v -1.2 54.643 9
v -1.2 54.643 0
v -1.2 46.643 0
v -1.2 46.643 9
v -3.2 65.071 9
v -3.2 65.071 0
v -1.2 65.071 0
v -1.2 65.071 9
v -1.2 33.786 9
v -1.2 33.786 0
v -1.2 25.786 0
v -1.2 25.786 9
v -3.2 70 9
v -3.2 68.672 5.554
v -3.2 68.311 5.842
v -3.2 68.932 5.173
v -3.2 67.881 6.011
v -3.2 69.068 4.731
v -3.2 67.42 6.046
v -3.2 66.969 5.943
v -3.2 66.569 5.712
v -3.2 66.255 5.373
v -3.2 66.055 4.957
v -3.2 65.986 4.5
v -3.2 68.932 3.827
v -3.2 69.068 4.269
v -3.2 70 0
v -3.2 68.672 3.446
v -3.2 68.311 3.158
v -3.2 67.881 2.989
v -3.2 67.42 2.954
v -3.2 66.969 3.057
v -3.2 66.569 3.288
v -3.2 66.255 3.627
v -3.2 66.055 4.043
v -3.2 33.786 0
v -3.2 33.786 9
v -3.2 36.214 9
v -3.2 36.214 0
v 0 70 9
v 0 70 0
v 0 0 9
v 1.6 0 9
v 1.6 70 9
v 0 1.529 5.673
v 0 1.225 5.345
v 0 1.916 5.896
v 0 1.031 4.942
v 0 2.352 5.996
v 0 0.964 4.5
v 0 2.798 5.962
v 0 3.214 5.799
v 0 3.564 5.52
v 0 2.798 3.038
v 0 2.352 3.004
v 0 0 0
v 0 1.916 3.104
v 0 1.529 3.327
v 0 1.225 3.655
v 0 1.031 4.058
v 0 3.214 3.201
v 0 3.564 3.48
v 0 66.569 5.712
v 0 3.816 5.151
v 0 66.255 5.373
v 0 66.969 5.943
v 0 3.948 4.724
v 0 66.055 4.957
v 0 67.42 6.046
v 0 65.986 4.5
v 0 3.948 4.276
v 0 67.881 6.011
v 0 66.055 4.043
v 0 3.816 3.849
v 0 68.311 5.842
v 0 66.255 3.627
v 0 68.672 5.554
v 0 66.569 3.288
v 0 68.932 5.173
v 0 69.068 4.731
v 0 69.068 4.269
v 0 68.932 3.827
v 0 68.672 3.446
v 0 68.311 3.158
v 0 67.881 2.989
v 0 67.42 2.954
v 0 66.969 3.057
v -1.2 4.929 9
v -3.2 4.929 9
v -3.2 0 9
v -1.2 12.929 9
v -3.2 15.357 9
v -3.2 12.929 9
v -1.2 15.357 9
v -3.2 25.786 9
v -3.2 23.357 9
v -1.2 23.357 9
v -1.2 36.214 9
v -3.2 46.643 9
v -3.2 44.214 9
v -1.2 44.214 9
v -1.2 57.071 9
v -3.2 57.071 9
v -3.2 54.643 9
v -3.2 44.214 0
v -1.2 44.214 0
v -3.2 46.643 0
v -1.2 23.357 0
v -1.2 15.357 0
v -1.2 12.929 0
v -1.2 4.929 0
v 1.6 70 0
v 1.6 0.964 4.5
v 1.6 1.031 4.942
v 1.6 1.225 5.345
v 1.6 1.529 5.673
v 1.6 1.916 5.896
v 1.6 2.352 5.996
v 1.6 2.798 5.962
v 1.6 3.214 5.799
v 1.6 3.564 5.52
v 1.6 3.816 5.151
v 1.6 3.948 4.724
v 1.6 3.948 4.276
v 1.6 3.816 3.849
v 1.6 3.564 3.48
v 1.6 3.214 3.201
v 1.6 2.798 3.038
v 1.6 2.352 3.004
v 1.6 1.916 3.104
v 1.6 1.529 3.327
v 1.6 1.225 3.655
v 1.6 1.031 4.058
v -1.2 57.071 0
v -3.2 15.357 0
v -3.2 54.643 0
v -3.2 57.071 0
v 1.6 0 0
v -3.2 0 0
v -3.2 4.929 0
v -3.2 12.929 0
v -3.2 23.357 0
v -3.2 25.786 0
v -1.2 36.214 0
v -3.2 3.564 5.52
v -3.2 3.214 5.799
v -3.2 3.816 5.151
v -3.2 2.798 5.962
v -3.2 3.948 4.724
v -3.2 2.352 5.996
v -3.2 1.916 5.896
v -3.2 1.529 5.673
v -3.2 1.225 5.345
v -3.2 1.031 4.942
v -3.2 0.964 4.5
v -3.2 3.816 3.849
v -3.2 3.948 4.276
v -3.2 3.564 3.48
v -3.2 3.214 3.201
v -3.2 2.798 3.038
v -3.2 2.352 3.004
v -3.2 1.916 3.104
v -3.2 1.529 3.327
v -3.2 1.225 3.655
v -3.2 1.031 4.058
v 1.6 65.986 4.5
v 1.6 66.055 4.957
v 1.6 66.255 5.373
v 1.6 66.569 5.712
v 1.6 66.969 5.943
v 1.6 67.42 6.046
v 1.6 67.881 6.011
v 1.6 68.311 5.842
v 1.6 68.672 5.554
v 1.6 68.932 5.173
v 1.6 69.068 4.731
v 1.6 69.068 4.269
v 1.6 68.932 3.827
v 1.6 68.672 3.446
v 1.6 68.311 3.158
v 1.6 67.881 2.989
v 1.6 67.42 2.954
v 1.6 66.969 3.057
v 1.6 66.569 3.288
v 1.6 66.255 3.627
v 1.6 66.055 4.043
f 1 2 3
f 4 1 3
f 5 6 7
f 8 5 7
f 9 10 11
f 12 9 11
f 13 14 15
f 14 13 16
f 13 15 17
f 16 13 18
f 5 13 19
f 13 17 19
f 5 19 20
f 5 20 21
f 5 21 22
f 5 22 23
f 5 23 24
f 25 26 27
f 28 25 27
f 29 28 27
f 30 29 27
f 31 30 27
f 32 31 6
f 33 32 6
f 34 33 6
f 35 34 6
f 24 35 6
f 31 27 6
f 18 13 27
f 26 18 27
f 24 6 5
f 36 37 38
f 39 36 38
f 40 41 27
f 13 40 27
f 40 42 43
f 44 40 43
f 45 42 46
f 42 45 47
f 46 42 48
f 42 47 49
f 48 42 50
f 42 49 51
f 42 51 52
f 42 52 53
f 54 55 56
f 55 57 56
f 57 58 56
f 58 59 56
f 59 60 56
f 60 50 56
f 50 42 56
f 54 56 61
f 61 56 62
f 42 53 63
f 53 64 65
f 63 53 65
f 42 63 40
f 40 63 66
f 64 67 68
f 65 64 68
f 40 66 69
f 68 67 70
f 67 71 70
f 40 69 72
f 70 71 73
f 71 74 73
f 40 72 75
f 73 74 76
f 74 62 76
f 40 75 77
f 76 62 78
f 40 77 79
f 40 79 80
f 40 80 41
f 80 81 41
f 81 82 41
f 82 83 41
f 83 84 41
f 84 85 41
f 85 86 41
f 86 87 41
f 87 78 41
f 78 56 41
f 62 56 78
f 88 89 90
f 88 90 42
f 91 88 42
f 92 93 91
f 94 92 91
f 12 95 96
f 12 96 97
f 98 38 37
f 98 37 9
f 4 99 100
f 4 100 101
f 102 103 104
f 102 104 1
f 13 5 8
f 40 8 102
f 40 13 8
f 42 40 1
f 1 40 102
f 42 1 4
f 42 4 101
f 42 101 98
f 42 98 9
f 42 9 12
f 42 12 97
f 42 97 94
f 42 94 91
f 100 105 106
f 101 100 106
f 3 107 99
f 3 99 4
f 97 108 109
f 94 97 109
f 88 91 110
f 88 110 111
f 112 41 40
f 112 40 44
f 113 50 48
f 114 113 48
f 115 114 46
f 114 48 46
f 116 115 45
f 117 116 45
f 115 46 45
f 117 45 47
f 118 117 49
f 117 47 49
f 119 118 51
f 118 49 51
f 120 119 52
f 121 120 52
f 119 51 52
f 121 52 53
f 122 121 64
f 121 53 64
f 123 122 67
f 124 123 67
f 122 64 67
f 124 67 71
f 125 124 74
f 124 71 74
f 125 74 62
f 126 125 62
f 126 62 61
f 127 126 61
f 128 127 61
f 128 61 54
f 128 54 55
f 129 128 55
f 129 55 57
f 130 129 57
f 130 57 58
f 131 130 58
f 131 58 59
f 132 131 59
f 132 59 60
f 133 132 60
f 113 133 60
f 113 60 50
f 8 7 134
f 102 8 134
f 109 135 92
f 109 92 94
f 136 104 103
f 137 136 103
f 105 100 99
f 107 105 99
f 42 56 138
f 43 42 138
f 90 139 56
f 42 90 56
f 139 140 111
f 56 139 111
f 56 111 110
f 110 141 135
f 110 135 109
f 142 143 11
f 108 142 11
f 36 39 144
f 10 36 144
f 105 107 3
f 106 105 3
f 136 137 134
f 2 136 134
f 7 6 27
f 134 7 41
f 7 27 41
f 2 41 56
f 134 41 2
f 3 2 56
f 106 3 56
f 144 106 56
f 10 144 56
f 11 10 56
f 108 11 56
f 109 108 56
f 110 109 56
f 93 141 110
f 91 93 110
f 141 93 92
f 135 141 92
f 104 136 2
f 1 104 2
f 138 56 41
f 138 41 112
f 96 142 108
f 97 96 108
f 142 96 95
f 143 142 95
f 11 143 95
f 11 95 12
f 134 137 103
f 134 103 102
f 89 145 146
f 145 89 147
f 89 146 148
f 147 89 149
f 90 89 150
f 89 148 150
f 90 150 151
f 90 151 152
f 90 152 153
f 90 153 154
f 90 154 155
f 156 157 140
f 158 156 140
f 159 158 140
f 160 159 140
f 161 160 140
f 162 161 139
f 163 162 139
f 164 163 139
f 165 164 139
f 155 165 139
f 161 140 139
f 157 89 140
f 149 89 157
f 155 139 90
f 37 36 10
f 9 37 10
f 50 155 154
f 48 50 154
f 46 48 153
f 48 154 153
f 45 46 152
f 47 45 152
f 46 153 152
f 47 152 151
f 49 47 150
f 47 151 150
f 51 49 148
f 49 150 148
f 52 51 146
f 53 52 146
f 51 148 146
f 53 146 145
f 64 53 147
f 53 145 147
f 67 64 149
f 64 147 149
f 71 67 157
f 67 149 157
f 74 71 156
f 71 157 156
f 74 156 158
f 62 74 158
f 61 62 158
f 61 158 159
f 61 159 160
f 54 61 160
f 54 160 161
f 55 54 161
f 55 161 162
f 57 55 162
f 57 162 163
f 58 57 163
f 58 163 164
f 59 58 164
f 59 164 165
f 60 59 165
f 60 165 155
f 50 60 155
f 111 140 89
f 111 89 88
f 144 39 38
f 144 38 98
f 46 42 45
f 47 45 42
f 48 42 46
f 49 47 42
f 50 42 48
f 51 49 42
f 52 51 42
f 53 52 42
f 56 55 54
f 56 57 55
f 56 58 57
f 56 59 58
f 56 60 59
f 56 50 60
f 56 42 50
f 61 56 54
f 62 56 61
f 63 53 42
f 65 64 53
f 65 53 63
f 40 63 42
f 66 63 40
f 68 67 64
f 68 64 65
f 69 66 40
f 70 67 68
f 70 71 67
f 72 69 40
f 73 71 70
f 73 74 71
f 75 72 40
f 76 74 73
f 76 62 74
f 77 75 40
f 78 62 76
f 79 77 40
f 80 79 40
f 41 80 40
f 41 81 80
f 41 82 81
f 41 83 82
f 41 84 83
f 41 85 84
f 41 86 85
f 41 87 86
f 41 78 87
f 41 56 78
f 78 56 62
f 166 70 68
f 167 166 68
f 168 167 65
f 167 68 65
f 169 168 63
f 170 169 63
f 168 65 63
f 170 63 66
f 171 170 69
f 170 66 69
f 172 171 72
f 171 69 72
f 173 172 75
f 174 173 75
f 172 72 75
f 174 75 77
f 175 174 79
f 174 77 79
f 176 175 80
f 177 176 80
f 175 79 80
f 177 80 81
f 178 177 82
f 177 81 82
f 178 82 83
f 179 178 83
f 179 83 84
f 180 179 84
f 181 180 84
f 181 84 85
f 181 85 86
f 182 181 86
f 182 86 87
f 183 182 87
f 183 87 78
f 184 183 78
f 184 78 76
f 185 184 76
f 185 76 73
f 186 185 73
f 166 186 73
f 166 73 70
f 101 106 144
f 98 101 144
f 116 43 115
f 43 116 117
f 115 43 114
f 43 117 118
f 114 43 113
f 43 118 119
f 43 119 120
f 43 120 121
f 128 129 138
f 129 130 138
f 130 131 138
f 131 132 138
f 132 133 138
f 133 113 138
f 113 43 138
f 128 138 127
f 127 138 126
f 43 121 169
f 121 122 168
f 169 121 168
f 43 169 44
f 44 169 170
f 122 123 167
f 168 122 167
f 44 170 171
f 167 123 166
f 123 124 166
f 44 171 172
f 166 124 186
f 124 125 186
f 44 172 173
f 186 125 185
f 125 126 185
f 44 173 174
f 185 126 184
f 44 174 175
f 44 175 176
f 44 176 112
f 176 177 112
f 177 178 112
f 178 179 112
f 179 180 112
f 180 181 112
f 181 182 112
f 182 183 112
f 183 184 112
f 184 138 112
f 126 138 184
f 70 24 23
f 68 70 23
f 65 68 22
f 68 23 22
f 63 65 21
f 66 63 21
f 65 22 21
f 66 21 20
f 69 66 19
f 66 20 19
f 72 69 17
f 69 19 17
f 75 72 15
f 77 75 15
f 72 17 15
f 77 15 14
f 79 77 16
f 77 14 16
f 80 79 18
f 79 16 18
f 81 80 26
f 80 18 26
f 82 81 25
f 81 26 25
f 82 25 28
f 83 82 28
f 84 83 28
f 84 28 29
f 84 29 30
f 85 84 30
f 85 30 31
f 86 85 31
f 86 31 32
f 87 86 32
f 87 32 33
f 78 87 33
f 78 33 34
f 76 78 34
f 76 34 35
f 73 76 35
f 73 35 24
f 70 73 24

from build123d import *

# Parameters (mm, degrees)
F0_W     = 2
F0_H     = 2.5
F0_H_2   = 2.4285714286
F2_DEPTH = 9
F1_W     = 1.6
F1_H     = 70
F3_R     = 1.55
F3_R_2   = 1.5
F4_DEPTH = 4.801


with BuildPart() as f2:
    # F0 (on Top) → F2 (new body)
    with BuildSketch(Plane.XY):
        Polygon((0, 70), (-1.2, 70), (-1.2, 67.5), (-1.2, 65.0714285714), (-1.2, 57.0714285714), (-1.2, 54.6428571429), (-1.2, 46.6428571429), (-1.2, 44.2142857143), (-1.2, 36.2142857143), (-1.2, 33.7857142857), (-1.2, 25.7857142857), (-1.2, 23.3571428571), (-1.2, 15.3571428571), (-1.2, 12.9285714286), (-1.2, 4.9285714286), (-1.2, 2.5), (-1.2, 0), (0, 0), align=None)
        with Locations((-2.2, 68.75)):
            Rectangle(F0_W, F0_H)
        with Locations((-2.2, 66.2857142857)):
            Rectangle(F0_W, F0_H_2)
        with Locations((-2.2, 1.25)):
            Rectangle(F0_W, F0_H)
        with Locations((-2.2, 55.8571428571)):
            Rectangle(F0_W, F0_H_2)
        with Locations((-2.2, 3.7142857143)):
            Rectangle(F0_W, F0_H_2)
        with Locations((-2.2, 45.4285714286)):
            Rectangle(F0_W, F0_H_2)
        with Locations((-2.2, 14.1428571429)):
            Rectangle(F0_W, F0_H_2)
        with Locations((-2.2, 35)):
            Rectangle(F0_W, F0_H_2)
        with Locations((-2.2, 24.5714285714)):
            Rectangle(F0_W, F0_H_2)
    extrude(amount=F2_DEPTH)


with BuildPart() as f2b:
    # F1 (on Top) → F2, piece 2 (new body)
    with BuildSketch(Plane.XY):
        with Locations((0.8, 35)):
            Rectangle(F1_W, F1_H)
    extrude(amount=F2_DEPTH)


with BuildPart() as f4_tool:
    # F3 (on face) → F4 (new body, through all)
    with BuildSketch(Plane(origin=(-3.2, 0, 0), x_dir=(0, -1, 0), z_dir=(-1, 0, 0))):
        with Locations((-67.5357142857, 4.5)):
            Circle(F3_R)
        with Locations((-2.4642857143, 4.5)):
            Circle(F3_R_2)
    extrude(amount=-F4_DEPTH)


with BuildPart() as f2_1:
    add(f2.part)

    # F4: cut by f4_tool
    add(f4_tool.part, mode=Mode.SUBTRACT)


with BuildPart() as f2b_1:
    add(f2b.part)

    # F4: cut by f4_tool
    add(f4_tool.part, mode=Mode.SUBTRACT)


solid = Compound([f2_1.part, f2b_1.part])
